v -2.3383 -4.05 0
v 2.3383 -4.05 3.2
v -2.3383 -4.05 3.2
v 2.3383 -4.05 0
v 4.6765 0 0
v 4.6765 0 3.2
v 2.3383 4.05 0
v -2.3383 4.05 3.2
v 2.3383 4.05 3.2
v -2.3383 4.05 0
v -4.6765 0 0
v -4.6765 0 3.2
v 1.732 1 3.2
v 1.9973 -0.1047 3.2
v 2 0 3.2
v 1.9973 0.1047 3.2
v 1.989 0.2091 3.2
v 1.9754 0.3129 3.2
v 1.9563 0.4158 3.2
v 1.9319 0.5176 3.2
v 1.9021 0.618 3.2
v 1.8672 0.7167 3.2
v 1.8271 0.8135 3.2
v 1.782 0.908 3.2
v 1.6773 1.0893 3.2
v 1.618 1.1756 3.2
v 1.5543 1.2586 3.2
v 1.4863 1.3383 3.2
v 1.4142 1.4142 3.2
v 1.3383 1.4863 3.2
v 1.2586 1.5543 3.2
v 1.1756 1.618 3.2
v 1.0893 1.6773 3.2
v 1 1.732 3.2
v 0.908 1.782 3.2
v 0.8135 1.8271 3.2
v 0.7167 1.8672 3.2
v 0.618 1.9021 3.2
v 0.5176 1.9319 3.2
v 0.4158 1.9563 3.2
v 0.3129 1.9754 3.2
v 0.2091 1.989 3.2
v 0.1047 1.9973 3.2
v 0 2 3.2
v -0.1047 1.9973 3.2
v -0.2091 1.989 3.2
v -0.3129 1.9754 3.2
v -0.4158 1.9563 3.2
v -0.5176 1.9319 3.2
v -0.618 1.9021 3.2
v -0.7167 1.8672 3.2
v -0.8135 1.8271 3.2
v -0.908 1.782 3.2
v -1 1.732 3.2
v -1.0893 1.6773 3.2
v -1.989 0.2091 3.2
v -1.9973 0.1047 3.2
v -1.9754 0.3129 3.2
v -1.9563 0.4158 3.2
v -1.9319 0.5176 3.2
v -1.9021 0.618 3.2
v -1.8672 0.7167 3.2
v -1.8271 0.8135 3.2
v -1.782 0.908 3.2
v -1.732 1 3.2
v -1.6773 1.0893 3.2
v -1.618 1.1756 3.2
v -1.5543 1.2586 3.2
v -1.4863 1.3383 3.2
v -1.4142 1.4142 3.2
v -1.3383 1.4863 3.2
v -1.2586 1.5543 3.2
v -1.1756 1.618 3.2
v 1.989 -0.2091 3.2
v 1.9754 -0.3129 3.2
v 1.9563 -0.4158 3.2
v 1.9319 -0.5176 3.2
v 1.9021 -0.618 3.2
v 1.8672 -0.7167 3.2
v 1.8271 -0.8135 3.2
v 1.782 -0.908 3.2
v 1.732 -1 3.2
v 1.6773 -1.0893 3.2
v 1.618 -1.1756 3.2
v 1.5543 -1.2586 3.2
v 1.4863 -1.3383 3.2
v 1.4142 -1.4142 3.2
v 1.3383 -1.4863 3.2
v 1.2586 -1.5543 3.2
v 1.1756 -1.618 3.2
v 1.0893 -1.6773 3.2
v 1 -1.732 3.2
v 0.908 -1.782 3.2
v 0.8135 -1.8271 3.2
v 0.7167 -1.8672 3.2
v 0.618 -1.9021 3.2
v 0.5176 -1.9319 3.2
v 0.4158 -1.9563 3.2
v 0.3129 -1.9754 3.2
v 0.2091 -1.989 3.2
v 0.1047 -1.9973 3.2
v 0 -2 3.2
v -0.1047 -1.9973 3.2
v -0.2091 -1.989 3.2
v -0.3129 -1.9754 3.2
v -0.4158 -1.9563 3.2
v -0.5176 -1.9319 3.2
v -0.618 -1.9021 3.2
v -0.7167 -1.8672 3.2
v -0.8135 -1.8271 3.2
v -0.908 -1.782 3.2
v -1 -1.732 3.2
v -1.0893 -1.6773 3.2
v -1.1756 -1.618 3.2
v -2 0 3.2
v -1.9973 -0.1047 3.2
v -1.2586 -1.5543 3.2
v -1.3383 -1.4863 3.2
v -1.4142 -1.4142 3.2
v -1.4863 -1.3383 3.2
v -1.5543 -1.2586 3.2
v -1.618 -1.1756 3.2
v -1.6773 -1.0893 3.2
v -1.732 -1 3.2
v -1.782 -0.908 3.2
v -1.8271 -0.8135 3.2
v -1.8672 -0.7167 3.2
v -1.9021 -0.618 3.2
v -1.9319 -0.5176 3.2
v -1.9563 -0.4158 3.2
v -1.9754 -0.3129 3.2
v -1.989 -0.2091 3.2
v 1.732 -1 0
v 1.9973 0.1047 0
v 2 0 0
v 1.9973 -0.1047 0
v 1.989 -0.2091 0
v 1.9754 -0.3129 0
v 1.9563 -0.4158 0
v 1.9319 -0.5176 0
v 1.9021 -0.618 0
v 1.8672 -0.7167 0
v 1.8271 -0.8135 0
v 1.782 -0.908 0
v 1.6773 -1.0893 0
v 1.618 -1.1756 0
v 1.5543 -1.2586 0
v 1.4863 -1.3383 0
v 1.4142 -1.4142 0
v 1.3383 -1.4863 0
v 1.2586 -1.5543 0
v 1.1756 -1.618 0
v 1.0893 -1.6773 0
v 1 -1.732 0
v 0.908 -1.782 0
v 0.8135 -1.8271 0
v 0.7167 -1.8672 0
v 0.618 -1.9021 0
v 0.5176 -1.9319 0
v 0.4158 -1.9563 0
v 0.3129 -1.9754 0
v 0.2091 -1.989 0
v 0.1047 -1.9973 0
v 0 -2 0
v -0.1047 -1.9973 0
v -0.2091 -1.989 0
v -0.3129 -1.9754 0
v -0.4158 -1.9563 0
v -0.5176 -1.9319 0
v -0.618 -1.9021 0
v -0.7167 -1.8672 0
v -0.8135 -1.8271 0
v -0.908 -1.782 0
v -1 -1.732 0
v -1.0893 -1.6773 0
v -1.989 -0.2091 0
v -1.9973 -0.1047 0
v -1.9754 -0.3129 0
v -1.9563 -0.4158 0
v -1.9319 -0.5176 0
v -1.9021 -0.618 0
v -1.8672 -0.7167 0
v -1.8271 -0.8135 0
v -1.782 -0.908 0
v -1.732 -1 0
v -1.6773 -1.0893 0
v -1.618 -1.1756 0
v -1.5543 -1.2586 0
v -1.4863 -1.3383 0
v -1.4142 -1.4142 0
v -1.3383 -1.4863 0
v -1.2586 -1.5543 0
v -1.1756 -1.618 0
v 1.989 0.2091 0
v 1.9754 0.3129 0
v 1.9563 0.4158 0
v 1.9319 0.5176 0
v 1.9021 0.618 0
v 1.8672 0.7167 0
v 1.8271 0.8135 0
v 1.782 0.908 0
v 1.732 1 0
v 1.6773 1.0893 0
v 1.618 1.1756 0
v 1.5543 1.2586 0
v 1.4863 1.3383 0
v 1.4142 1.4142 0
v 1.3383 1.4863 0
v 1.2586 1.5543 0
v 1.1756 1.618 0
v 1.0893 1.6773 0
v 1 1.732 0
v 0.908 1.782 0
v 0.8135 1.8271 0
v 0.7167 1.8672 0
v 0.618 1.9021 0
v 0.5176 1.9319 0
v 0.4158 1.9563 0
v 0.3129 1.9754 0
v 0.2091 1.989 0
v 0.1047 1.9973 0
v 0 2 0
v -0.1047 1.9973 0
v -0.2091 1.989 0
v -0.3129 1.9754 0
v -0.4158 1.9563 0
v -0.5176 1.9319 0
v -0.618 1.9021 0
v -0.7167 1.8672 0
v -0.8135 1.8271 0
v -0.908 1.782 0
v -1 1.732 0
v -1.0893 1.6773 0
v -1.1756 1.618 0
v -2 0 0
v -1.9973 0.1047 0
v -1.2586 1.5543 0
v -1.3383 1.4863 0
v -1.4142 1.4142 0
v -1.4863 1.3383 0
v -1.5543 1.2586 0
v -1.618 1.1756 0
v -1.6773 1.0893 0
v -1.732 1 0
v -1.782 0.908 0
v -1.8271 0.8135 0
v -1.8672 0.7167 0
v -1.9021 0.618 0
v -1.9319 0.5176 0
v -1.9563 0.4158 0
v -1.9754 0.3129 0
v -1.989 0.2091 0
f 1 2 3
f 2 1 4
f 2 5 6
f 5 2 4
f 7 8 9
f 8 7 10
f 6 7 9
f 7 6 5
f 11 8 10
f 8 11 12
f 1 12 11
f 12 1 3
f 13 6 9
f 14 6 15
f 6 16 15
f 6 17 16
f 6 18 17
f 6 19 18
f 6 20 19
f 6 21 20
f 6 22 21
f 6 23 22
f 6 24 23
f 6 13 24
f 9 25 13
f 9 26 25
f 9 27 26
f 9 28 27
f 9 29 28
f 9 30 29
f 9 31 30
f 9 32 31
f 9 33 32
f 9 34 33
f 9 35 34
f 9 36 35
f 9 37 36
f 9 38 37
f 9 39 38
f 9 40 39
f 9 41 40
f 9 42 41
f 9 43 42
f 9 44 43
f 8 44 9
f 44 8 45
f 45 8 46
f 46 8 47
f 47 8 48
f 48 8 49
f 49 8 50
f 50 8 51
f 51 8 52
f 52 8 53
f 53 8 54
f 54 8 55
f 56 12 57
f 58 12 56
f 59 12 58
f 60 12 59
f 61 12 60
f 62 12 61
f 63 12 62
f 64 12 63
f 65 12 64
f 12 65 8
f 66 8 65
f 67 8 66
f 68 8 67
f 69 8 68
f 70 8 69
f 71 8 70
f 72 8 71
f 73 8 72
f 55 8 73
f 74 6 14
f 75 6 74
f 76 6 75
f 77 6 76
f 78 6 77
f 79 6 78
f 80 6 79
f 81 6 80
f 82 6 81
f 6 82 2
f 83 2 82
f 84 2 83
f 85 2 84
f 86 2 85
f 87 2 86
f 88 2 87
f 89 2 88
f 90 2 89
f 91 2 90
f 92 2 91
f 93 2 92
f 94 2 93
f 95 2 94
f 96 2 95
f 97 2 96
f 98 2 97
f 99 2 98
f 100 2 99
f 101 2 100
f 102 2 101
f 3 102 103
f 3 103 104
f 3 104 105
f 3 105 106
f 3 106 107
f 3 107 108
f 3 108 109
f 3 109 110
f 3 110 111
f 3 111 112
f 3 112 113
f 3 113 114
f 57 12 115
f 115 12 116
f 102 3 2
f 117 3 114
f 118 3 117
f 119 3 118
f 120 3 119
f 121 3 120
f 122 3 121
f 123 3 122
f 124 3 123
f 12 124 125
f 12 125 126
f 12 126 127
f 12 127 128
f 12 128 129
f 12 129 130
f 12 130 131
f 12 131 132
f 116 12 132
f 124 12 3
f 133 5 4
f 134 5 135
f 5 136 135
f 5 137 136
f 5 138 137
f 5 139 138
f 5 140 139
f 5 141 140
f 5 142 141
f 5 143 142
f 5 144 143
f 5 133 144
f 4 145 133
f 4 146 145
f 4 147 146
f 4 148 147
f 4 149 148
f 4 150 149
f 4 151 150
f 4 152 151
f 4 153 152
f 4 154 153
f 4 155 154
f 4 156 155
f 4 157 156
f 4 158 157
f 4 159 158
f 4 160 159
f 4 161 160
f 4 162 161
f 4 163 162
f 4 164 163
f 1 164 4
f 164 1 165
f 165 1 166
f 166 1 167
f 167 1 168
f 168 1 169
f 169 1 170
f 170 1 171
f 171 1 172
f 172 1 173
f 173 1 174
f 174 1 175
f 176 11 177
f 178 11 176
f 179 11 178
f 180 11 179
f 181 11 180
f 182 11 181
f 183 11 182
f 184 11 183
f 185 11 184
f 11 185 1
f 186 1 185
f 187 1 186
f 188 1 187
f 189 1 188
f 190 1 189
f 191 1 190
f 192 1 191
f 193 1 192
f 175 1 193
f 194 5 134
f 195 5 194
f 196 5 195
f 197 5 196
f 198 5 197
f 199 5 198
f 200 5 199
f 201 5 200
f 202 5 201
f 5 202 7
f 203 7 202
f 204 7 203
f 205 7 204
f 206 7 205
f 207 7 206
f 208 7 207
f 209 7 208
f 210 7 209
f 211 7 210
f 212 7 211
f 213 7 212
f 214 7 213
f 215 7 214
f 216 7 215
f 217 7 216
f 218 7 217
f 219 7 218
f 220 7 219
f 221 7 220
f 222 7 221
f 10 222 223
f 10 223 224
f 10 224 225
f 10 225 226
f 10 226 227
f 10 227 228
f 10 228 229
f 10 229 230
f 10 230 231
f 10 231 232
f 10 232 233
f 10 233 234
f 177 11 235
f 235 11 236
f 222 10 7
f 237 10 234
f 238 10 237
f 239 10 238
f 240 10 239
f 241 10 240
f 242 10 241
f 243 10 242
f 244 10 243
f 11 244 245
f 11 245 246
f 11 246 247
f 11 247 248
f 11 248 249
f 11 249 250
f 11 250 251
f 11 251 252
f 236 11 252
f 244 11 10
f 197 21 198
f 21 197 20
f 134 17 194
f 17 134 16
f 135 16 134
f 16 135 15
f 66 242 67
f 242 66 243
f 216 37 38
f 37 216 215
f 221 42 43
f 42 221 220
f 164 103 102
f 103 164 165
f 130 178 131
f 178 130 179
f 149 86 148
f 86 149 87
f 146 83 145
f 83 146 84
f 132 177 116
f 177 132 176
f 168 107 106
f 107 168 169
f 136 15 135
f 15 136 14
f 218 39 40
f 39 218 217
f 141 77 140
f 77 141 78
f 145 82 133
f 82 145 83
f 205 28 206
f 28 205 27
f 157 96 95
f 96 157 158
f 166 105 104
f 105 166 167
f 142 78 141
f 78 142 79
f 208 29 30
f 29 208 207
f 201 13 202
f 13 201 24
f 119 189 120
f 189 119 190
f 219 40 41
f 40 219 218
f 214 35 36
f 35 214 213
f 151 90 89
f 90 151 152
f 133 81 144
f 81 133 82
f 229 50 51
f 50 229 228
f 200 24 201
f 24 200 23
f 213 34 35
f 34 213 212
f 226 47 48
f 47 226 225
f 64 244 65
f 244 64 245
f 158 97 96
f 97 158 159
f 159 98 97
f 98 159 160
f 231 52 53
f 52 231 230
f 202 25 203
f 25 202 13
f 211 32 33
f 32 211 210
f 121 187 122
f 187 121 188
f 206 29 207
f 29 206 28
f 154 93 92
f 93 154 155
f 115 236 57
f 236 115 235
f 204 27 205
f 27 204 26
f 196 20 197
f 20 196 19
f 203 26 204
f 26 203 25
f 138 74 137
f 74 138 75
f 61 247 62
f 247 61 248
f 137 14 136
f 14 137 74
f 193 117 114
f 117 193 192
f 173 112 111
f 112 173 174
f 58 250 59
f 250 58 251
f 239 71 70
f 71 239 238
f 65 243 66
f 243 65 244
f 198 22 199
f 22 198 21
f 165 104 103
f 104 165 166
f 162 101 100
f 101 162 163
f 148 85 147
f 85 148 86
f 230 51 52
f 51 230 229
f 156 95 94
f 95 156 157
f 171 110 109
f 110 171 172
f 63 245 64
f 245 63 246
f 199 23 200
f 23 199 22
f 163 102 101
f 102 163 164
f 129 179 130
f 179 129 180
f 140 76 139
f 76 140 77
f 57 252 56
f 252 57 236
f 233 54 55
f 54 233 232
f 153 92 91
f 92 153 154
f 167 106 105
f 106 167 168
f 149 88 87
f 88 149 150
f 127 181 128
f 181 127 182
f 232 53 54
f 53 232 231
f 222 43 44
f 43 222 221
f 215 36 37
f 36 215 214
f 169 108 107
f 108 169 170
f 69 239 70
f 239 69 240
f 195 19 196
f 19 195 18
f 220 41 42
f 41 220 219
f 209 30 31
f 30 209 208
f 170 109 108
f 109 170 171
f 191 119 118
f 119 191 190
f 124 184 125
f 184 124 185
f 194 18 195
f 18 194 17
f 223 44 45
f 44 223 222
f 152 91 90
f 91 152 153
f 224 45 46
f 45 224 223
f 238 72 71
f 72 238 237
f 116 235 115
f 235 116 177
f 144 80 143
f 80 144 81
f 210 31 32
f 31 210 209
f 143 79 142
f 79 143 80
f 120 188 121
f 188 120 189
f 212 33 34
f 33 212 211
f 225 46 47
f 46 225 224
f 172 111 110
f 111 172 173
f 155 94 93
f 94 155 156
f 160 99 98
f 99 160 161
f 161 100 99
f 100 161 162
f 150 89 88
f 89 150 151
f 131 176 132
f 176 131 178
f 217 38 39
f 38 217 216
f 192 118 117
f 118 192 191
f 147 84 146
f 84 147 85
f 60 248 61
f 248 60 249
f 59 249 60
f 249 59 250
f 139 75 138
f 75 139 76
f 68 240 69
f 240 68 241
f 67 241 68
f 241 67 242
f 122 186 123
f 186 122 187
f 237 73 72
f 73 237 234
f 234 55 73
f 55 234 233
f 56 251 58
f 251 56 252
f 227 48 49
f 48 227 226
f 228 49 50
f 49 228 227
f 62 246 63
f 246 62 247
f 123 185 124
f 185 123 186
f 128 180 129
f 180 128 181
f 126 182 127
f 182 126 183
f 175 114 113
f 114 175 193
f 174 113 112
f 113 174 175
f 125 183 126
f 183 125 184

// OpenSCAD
$fn = 120;

across_flats = 8.1;   // mm
thickness    = 3.2;   // mm
hole_d       = 4.0;   // mm (clearance as specified)

module hex_prism_af(af, h) {
    // For a regular hexagon: across_flats = sqrt(3) * circumradius
    r = af / sqrt(3);
    cylinder(h = h, r = r, $fn = 6);
}

difference() {
    hex_prism_af(across_flats, thickness);
    translate([0,0,-0.1])
        cylinder(h = thickness + 0.2, d = hole_d, $fn = 120);
}
